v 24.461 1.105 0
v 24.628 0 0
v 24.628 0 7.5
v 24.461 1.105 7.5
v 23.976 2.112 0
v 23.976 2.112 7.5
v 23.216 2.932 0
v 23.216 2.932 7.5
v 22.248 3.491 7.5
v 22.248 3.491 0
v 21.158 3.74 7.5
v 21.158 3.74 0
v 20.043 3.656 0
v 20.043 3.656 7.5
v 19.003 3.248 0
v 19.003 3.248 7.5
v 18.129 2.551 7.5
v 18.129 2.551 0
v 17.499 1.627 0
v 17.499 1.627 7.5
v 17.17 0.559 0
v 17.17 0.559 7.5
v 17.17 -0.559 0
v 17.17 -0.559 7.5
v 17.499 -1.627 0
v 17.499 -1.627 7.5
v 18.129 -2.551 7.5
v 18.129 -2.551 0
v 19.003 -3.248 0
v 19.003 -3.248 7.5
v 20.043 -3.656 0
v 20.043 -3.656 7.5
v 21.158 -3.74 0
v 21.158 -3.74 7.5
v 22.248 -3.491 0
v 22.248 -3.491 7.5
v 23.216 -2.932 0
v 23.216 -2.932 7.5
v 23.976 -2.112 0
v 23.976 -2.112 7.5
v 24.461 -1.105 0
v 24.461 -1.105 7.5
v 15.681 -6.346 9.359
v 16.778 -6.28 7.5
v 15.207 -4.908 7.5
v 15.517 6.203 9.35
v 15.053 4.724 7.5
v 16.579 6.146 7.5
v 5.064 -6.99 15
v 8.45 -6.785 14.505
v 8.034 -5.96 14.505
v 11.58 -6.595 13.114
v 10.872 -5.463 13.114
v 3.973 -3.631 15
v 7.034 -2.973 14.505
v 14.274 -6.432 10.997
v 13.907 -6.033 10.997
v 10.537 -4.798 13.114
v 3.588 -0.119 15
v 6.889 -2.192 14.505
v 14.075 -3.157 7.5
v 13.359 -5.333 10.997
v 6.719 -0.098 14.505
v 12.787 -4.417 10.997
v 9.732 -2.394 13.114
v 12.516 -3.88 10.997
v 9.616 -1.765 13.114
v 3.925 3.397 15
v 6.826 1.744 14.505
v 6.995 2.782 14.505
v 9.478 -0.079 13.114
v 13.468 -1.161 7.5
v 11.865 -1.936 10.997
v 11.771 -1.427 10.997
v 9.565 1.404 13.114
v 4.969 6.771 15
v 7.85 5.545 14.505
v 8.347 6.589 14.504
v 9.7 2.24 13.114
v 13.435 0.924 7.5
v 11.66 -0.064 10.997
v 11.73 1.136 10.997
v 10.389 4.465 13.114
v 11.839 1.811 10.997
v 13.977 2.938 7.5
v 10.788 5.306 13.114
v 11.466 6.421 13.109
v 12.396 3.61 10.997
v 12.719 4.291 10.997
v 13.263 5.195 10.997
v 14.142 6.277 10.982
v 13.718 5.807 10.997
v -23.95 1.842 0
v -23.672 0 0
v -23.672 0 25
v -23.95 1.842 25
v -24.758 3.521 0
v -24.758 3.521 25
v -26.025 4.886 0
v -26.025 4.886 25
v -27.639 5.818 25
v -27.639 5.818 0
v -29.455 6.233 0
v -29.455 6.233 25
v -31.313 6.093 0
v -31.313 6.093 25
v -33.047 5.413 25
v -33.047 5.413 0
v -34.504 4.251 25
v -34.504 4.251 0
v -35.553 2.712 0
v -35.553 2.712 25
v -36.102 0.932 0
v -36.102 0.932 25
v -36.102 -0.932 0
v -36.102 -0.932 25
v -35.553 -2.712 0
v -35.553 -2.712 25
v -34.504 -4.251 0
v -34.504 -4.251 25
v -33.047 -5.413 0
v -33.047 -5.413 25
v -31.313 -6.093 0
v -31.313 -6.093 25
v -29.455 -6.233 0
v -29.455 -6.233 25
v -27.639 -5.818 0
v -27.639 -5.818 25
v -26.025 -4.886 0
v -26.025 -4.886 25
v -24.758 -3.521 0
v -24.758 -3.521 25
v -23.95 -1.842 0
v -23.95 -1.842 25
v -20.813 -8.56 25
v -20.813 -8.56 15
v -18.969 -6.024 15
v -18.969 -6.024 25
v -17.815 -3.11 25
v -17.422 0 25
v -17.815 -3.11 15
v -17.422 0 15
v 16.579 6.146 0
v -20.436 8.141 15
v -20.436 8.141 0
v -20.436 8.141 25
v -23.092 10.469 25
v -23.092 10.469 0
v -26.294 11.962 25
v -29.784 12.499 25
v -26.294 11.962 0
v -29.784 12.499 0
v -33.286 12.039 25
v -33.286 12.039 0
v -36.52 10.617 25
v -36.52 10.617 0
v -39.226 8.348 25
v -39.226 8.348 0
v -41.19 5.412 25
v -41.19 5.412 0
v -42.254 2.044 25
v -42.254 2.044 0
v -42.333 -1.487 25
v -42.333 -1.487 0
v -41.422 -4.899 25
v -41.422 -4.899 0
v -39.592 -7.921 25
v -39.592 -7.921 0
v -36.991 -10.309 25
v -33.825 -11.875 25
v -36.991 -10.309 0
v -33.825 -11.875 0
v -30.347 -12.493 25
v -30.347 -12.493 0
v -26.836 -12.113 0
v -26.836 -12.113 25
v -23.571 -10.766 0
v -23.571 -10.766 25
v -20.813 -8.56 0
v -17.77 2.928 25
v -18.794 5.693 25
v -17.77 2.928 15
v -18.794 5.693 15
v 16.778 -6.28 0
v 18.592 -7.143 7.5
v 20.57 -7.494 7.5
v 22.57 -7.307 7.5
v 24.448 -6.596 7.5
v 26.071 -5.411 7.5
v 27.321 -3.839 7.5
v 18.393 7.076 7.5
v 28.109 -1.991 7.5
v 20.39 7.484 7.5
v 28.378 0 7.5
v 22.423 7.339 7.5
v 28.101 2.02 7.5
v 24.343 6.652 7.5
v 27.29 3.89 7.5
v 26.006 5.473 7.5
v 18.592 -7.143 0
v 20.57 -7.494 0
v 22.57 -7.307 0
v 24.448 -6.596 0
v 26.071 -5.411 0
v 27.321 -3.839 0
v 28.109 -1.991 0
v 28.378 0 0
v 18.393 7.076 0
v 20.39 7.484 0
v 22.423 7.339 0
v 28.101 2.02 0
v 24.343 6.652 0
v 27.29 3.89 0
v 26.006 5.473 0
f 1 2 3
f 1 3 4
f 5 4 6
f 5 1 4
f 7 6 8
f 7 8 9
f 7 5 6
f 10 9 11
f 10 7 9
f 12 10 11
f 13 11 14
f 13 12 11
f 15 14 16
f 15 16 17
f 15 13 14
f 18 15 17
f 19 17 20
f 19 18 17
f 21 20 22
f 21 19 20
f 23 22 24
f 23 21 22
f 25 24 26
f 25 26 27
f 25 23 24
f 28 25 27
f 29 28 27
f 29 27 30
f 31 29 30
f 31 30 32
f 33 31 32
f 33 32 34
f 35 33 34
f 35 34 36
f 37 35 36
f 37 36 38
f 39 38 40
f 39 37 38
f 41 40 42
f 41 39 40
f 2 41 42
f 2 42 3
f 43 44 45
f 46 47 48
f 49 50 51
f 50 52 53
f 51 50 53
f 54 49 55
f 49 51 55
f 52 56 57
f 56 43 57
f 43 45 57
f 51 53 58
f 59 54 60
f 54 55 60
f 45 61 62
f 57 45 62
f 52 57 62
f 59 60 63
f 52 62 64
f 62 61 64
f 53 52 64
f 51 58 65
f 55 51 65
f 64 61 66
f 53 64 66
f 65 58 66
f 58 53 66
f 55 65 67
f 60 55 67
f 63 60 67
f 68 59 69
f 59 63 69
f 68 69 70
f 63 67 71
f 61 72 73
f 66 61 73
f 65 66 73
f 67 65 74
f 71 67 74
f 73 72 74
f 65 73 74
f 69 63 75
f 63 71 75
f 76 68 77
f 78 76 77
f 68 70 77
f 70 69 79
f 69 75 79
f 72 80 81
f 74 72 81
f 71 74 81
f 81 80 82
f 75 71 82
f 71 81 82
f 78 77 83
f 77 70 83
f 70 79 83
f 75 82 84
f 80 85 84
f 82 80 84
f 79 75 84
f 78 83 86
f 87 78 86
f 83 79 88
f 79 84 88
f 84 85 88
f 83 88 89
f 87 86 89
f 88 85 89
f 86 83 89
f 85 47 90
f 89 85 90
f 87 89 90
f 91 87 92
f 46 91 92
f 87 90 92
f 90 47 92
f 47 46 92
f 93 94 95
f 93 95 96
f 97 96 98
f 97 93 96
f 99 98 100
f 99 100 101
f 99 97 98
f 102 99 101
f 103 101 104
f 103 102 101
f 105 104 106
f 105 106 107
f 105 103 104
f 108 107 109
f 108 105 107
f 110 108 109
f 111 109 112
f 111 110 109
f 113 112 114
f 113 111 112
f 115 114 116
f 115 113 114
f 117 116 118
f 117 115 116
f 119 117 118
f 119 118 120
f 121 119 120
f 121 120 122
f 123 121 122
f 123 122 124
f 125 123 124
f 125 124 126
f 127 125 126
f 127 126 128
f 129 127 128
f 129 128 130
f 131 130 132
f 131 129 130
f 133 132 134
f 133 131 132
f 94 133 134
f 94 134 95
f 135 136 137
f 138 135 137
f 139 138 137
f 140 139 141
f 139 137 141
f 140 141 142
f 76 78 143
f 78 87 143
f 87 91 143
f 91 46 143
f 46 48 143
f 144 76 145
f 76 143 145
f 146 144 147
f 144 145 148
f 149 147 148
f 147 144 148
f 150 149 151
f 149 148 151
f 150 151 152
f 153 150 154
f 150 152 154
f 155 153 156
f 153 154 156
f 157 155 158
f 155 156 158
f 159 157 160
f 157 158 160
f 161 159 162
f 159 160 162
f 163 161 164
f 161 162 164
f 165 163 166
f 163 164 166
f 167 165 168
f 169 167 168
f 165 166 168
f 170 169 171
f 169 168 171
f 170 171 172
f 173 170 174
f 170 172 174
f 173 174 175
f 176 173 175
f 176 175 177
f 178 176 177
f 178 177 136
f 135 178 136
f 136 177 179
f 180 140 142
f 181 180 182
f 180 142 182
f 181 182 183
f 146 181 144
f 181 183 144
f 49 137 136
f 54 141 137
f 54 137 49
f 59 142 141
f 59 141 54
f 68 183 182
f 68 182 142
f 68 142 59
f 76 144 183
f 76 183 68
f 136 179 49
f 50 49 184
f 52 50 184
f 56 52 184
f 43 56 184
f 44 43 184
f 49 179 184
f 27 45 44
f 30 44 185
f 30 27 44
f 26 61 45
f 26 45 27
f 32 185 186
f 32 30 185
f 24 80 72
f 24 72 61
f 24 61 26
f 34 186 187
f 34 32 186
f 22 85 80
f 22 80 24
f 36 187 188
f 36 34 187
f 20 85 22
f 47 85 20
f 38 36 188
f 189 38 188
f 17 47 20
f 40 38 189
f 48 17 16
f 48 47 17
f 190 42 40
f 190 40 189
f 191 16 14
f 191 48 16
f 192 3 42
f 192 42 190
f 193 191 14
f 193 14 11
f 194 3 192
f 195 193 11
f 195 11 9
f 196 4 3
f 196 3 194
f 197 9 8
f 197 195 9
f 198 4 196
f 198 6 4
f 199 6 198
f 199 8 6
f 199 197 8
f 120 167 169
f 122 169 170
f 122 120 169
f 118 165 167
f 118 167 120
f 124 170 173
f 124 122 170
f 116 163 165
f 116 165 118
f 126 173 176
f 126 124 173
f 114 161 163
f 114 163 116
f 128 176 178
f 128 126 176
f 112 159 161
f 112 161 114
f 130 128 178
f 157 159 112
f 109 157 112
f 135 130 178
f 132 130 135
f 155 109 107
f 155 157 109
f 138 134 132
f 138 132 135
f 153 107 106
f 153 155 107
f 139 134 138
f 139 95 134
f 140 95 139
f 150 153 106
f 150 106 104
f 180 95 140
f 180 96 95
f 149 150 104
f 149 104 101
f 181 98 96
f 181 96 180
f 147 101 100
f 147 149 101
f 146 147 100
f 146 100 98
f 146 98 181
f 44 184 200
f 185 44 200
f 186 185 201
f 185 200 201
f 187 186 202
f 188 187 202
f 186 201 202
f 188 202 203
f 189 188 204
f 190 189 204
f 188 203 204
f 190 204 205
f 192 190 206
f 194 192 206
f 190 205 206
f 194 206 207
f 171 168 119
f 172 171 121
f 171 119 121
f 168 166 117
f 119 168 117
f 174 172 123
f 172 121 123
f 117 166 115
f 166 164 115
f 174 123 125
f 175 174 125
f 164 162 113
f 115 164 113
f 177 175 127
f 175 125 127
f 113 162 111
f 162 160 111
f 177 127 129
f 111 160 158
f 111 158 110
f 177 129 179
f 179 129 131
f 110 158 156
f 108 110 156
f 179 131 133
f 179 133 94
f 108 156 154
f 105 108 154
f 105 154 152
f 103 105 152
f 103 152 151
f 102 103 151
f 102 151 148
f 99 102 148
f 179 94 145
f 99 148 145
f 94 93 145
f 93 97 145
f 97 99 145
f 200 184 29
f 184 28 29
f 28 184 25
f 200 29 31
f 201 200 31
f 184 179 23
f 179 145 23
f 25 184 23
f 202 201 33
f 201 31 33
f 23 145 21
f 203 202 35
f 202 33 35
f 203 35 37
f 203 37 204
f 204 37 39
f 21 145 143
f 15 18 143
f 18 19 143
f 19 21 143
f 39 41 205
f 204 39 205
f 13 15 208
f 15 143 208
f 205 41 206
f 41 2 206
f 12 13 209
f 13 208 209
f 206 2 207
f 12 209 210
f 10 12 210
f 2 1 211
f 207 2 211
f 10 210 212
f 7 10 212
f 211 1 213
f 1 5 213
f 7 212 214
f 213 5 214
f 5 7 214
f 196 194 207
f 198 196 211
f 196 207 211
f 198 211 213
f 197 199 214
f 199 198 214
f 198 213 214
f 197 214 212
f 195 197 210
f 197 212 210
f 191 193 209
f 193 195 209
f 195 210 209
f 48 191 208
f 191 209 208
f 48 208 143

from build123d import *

# Parameters (mm, degrees)
F0_R        = 6.25
F1_DEPTH    = 25
F2_DEPTH    = 15
F0_R_2      = 3.75
F3_DEPTH    = 7.5
F4_T2_ANGLE = 359.64


# Not quite as in the source:
# - a fillet or chamfer that OpenCascade refuses, or shapes differently, is made with other operations: its cross-section is extruded or revolved along the edge and cut away or added


with BuildPart() as f1:
    # F0 (on Top) → F1 (new body)
    with BuildSketch(Plane.XY):
        with BuildLine():
            ThreePointArc((-20.8125196211, -8.5595397618), (-18.3005664883, -4.6032795782), (-17.4220903611, 0))
            ThreePointArc((-17.4220903611, 0), (-18.1998915609, 4.3405132519), (-20.4364992075, 8.1408574773))
            ThreePointArc((-20.4364992075, 8.1408574773), (-42.4189230977, 0.2813743978), (-20.8125196211, -8.5595397618))
        make_face()
        with Locations((-29.9220903611, 0)):
            Circle(F0_R, mode=Mode.SUBTRACT)
    extrude(amount=F1_DEPTH)

    # F0 (on Top) → F2 (join)
    with BuildSketch(Plane.XY):
        with BuildLine():
            ThreePointArc((-20.4364992075, 8.1408574773), (-18.1998915609, 4.3405132519), (-17.4220903611, 0))
            ThreePointArc((-17.4220903611, 0), (-18.3005664883, -4.6032795782), (-20.8125196211, -8.5595397618))
            Line((-20.8125196211, -8.5595397618), (16.7775256305, -6.2798766695))
            ThreePointArc((16.7775256305, -6.2798766695), (13.3788672096, -0.1198442426), (16.5789499879, 6.1456444673))
            Line((16.5789499879, 6.1456444673), (-20.4364992075, 8.1408574773))
        make_face()
    extrude(amount=F2_DEPTH)

    # F0 (on Top) → F3 (join)
    with BuildSketch(Plane.XY):
        with BuildLine():
            ThreePointArc((28.3779096389, 0), (24.3425743137, 6.651774101), (16.5789499879, 6.1456444673))
            ThreePointArc((16.5789499879, 6.1456444673), (13.3788672096, -0.1198442426), (16.7775256305, -6.2798766695))
            ThreePointArc((16.7775256305, -6.2798766695), (24.4484222028, -6.5955621467), (28.3779096389, 0))
        make_face()
        with Locations((20.8779096389, 0)):
            Circle(F0_R_2, mode=Mode.SUBTRACT)
    extrude(amount=F3_DEPTH)

    # F4: fillet of radius 10.139696962 on 1 edges, made by hand

    # F4_s1 → F4_t2 (revolve, cut)
    with BuildSketch(Plane(origin=(0.0034409593, -0.268007829, 0), x_dir=(0, 0, 1), z_dir=(-0.0128379671, 0.9999175899, 0))):
        with BuildLine():
            ThreePointArc((15, 38.1662582623), (12.909501189, 31.999908969), (7.5, 28.3761890884))
            Line((7.5, 28.3761890884), (15, 28.3761890884))
            Line((15, 28.3761890884), (15, 38.1662582623))
        make_face()
    revolve(axis=Axis((20.8779096389, 0, 15), (0, 0, -1)), revolution_arc=F4_T2_ANGLE, mode=Mode.SUBTRACT)


solid = f1.part
